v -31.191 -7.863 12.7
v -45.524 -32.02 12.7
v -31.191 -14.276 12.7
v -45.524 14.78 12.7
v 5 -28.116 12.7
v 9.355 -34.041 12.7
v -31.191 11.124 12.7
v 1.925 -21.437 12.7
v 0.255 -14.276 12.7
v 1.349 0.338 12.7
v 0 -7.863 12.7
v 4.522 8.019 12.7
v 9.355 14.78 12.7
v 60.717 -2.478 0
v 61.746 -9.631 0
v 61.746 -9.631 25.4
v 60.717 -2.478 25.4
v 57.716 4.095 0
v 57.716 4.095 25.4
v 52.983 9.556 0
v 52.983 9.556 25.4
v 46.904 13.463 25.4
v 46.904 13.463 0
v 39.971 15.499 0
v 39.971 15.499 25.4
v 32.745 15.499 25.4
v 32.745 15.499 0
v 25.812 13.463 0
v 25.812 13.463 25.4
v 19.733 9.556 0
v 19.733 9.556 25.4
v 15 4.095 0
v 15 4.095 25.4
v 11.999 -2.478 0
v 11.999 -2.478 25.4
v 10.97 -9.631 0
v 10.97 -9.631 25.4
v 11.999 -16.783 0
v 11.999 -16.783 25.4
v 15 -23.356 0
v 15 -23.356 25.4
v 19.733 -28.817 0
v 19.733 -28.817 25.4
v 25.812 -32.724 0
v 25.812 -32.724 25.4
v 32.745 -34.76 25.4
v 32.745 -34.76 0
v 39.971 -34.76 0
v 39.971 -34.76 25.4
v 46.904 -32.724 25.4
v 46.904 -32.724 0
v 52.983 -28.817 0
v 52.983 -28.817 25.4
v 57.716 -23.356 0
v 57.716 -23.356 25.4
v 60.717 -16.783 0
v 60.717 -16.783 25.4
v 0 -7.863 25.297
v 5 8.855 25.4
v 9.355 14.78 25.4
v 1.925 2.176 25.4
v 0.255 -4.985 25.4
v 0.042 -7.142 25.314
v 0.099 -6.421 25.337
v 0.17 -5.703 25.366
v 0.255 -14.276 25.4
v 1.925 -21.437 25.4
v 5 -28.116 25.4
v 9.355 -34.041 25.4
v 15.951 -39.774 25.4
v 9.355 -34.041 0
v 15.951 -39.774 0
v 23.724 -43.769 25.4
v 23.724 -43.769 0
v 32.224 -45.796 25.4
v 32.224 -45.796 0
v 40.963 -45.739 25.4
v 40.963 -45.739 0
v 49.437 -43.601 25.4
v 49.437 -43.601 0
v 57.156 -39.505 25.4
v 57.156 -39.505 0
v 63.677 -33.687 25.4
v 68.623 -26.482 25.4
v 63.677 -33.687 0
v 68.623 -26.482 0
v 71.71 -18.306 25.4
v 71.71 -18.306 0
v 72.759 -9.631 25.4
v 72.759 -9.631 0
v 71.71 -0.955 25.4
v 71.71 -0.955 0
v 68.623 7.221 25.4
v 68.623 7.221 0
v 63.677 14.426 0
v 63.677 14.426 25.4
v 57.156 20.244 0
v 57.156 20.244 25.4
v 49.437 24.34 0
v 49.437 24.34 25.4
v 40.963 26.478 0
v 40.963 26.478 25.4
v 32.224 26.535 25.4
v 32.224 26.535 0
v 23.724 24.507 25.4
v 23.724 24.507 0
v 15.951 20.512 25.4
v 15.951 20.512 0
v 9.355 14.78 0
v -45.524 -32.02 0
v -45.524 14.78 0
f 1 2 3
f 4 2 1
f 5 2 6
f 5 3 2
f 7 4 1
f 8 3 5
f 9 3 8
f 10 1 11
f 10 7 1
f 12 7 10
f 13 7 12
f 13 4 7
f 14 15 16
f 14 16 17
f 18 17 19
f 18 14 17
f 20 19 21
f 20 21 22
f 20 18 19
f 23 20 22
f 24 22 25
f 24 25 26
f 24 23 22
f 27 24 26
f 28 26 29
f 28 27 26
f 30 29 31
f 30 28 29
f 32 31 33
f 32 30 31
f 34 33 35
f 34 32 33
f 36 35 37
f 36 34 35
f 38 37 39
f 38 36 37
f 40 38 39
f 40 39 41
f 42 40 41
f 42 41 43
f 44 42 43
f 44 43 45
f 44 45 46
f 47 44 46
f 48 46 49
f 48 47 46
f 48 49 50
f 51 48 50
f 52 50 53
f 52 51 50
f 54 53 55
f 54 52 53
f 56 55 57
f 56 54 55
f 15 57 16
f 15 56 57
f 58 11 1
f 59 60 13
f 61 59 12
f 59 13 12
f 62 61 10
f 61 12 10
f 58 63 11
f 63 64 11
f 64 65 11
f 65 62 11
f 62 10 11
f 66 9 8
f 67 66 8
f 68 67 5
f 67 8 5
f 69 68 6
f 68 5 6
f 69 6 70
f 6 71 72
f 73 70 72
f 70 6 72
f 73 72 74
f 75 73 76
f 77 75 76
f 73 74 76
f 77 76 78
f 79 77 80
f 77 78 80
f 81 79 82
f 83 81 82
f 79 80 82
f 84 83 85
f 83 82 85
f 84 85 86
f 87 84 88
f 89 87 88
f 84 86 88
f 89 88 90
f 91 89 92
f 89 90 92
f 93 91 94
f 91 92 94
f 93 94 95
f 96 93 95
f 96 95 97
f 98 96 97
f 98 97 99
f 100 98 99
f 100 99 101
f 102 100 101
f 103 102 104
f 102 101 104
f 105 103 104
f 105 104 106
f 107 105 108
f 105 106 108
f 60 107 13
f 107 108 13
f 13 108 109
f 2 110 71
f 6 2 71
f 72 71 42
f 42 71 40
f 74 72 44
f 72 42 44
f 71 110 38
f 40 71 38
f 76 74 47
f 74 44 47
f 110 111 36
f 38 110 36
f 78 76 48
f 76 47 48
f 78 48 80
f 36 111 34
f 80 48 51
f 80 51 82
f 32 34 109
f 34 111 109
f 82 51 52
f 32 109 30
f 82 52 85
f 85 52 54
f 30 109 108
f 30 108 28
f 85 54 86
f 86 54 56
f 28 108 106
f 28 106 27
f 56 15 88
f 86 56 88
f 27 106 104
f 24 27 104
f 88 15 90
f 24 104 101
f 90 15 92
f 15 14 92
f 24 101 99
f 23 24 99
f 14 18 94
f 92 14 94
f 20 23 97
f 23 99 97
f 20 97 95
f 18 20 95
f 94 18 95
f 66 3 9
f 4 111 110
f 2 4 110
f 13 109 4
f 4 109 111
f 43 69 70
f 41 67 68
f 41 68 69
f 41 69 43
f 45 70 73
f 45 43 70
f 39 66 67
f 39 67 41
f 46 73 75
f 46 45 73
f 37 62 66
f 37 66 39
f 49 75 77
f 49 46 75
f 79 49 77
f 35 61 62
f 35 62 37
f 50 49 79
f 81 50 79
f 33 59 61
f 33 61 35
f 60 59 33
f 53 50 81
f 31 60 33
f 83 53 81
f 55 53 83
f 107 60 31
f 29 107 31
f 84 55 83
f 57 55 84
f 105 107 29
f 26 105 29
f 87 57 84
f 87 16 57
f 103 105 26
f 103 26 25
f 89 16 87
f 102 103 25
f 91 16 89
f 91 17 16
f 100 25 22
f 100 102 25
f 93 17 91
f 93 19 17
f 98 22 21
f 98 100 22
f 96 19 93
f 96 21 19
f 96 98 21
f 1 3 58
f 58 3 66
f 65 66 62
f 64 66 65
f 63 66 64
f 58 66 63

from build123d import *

# Parameters (mm, degrees)
F0_R     = 25.387749
F1_DEPTH = 25.4
F2_DEPTH = 12.7
F4_DEPTH = 25.4


with BuildPart() as f1:
    # F0 (on Top) → F1 (new body)
    with BuildSketch(Plane.XY):
        with BuildLine():
            Line((-31.190502, -14.275898), (0.254667, -14.275898))
            ThreePointArc((0.254667, -14.275898), (3.293439, -24.854389), (9.355083, -34.041069))
            ThreePointArc((9.355083, -34.041069), (72.758975, -9.630573), (9.355083, 14.779924))
            ThreePointArc((9.355083, 14.779924), (2.715424, 4.269314), (0, -7.862646))
            Line((0, -7.862646), (-31.190502, -7.862646))
            Line((-31.190502, -7.862646), (-31.190502, -14.275898))
        make_face()
        with Locations((36.358009, -9.630573)):
            Circle(F0_R, mode=Mode.SUBTRACT)
    extrude(amount=F1_DEPTH)

    # F0 (on Top) → F2 (join)
    with BuildSketch(Plane.XY):
        with BuildLine():
            ThreePointArc((9.355083, -34.041069), (3.293439, -24.854389), (0.254667, -14.275898))
            Line((0.254667, -14.275898), (-31.190502, -14.275898))
            Line((-31.190502, -14.275898), (-31.190502, -7.862646))
            Line((-31.190502, -7.862646), (0, -7.862646))
            ThreePointArc((0, -7.862646), (2.715424, 4.269314), (9.355083, 14.779924))
            Line((9.355083, 14.779924), (-45.523933, 14.779924))
            Line((-45.523933, 14.779924), (-45.523933, -32.019987))
            Line((-45.523933, -32.019987), (9.355083, -34.041069))
        make_face()
    extrude(amount=F2_DEPTH)

    # F3 (on face) → F4 (cut)
    with BuildSketch(Plane.XZ.offset(14.275898)):
        Polygon((-31.190502, 12.7), (0.254667, 25.4), (-31.190502, 25.4), align=None)
    extrude(amount=-F4_DEPTH, mode=Mode.SUBTRACT)


solid = f1.part
